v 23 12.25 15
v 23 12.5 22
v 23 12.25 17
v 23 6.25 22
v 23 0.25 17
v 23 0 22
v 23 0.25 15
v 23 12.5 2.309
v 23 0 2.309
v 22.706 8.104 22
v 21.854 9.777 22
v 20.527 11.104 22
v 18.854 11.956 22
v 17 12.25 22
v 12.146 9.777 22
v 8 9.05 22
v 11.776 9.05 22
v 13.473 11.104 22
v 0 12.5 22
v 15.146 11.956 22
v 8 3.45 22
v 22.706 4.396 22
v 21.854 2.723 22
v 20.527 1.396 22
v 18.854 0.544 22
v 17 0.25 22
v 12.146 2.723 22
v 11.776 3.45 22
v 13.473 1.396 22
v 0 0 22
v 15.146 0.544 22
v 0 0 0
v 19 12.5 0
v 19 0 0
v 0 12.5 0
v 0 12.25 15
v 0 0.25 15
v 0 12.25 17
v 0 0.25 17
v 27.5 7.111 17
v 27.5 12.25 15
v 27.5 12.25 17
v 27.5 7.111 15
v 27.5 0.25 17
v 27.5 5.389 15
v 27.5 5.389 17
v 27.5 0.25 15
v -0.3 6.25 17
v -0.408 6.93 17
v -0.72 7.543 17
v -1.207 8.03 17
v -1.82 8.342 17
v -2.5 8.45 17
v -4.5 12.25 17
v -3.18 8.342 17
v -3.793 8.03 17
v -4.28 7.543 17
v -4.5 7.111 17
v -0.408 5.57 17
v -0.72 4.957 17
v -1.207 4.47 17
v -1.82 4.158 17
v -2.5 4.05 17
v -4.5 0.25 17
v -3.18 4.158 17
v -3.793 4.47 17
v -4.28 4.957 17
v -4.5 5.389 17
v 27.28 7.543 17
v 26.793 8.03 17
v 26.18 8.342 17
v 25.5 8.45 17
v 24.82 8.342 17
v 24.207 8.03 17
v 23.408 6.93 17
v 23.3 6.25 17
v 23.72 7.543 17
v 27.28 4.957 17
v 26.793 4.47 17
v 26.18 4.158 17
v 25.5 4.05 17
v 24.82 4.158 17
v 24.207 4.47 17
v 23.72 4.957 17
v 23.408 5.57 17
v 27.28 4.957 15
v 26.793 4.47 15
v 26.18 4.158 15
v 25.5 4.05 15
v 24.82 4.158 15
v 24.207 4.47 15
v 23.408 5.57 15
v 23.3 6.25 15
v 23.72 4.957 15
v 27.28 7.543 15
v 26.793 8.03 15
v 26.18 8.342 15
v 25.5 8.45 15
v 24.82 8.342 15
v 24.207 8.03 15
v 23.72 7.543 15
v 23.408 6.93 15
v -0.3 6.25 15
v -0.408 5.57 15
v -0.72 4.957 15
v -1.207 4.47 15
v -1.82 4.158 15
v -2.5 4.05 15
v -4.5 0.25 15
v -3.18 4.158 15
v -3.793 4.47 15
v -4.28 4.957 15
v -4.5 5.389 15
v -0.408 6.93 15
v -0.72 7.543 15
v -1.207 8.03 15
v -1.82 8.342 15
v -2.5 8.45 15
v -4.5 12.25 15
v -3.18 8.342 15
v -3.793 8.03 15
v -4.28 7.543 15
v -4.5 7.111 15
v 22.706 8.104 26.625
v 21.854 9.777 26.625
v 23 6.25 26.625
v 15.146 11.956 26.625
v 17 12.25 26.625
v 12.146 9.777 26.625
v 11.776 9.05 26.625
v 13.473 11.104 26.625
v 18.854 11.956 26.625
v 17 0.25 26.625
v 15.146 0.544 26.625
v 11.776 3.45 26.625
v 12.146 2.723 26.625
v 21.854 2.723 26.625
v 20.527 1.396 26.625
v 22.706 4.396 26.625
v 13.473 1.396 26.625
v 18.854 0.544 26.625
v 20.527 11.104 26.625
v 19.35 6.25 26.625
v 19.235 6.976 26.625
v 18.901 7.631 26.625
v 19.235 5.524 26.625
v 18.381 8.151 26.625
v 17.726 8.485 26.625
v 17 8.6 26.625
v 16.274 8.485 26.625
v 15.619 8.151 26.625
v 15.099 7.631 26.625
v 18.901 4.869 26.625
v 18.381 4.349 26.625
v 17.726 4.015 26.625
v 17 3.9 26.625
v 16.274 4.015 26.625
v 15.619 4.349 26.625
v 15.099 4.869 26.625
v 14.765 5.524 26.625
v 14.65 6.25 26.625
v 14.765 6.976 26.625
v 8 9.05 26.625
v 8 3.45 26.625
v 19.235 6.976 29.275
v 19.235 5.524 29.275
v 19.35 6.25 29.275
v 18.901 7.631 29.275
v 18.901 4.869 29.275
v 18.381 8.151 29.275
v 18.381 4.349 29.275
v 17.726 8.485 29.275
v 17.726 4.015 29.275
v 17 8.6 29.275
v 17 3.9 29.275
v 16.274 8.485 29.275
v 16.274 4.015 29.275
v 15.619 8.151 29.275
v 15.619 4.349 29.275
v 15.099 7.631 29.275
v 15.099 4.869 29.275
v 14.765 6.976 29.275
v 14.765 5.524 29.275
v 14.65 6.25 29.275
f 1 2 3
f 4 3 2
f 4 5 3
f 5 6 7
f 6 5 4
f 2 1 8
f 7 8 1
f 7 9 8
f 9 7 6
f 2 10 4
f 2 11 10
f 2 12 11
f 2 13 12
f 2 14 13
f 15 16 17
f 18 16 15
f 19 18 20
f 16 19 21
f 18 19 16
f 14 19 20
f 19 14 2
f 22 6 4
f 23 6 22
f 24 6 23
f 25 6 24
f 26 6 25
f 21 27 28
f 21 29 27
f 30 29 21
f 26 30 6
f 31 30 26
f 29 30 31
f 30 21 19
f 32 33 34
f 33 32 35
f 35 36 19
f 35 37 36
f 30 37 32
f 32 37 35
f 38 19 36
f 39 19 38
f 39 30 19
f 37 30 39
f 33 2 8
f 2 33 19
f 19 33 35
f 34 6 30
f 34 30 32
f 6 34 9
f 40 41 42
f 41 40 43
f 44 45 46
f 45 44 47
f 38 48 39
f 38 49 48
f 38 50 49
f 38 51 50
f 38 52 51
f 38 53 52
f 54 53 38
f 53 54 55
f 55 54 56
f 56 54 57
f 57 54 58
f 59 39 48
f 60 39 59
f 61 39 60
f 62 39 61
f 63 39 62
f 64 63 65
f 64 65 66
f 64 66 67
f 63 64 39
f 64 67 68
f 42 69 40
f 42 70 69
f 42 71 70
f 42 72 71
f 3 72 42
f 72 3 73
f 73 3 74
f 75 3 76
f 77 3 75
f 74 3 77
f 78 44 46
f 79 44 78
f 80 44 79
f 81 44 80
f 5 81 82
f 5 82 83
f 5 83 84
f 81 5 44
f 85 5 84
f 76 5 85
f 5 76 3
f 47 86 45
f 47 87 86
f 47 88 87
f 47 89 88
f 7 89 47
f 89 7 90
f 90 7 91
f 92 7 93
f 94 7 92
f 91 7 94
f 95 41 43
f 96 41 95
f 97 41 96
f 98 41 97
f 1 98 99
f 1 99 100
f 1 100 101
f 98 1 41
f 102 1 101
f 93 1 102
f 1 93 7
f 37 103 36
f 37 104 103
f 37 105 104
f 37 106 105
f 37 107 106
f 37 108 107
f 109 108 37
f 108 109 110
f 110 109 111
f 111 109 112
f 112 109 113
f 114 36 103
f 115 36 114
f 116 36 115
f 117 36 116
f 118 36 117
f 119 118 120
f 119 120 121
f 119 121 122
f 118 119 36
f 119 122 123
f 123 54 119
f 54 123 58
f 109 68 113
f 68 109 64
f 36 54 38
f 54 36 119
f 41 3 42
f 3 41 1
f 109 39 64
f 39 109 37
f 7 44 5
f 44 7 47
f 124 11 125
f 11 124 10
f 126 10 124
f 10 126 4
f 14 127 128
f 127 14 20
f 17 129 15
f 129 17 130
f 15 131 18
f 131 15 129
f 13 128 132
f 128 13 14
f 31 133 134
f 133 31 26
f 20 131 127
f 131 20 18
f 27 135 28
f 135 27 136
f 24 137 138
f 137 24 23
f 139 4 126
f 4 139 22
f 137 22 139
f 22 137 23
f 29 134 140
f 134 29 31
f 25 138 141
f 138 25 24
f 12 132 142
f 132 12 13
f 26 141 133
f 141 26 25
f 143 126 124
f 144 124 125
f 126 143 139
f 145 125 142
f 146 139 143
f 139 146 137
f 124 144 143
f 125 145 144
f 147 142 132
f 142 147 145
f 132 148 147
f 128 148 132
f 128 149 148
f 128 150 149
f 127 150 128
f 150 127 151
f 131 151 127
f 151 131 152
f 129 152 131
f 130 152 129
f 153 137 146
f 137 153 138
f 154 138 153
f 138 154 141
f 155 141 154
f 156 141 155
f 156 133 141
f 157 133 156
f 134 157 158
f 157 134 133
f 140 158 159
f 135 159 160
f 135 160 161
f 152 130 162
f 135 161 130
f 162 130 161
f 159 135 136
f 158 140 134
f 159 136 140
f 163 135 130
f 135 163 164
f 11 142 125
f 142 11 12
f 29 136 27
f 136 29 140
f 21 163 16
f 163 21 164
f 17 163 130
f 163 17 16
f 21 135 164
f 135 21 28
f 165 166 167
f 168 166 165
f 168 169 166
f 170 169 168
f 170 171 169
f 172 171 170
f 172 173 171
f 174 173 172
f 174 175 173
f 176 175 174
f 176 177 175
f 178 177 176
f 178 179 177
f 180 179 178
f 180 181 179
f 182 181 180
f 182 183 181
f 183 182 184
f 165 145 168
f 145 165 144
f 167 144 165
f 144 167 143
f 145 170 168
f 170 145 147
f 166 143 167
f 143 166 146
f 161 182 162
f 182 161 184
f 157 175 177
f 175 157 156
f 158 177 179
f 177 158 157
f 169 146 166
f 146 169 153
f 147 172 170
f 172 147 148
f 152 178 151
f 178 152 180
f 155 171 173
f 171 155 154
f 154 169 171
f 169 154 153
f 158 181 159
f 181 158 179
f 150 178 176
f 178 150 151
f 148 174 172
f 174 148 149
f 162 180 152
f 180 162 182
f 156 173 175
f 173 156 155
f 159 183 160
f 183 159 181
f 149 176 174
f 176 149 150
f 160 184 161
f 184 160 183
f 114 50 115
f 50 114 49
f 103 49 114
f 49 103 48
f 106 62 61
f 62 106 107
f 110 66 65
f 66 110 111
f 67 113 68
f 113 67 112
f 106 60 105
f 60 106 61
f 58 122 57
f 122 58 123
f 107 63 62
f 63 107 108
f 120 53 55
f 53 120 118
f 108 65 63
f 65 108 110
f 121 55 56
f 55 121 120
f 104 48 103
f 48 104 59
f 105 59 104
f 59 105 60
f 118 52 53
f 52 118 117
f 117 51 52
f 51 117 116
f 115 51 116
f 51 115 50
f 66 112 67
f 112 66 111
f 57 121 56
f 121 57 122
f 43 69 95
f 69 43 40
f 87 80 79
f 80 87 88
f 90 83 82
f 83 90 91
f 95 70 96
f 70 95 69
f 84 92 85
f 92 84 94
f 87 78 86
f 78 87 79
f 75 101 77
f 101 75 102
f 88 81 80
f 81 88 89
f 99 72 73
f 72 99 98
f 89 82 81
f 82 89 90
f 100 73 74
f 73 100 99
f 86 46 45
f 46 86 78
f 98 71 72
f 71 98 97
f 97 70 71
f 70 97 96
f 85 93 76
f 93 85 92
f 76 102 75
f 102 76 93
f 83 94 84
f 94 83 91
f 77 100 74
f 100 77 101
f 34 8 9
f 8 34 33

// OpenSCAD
// file: libraries/ng_motor.scad
// Courtesy of http://www.thingiverse.com/thing:29734/

// base length, width, height
ng_motor_bl = 23;
ng_motor_bw = 12.5;
ng_motor_bh = 22;
ng_motor_bdim = [ng_motor_bl, ng_motor_bw, ng_motor_bh];
// mount length, width, height, x offset, y offset, bottom
ng_motor_ml = 32;
ng_motor_mw = 12;
ng_motor_mh = 2;
ng_motor_mdim = [ng_motor_ml, ng_motor_mw, ng_motor_mh];
ng_motor_mx = (ng_motor_bl - ng_motor_ml) / 2;
ng_motor_my = (ng_motor_bw - ng_motor_mw) / 2;
ng_motor_mbot = ng_motor_bh / 2 + 4;
ng_motor_mpos = [ng_motor_mx, ng_motor_my, ng_motor_mbot];
// shaft base x offset, bottom, radius, and height
ng_motor_sbr = 6;
ng_motor_sbh = 4.625;
ng_motor_sbx = ng_motor_bl / 2 + 5.5;
ng_motor_sbbot = ng_motor_bh;
ng_motor_sby = ng_motor_bw / 2;
ng_motor_sbpos = [ng_motor_sbx, ng_motor_sby, ng_motor_sbbot];
// Ignoring the small, insignificant circle
// Drive gear x offset, y offset, bottom, length, width, height
ng_motor_dgl = 5;
ng_motor_dgw = 5.6;
ng_motor_dgh = 4.625;
ng_motor_dgdim = [ng_motor_dgl, ng_motor_dgw, ng_motor_dgh];
ng_motor_dgx = ng_motor_bl / 2 - ng_motor_dgl / 2 - 1;
ng_motor_dgy = ng_motor_bw / 2 - ng_motor_dgw / 2;
ng_motor_dgbot = ng_motor_bh;
ng_motor_dgpos = [ng_motor_dgx, ng_motor_dgy, ng_motor_dgbot];
// Drive axle radius, height, x offset, y offset, bottom
ng_motor_dar = 2.35;
ng_motor_dah = 2.65;
ng_motor_dax = ng_motor_bl / 2 + 5.5;
ng_motor_day = ng_motor_bw / 2;
ng_motor_dabot = ng_motor_sbbot + ng_motor_sbh;
ng_motor_dapos = [ng_motor_dax, ng_motor_day, ng_motor_dabot];
// Cutout x offset, y offset, bottom, angle, length, width, height
ng_motor_cl = 8;
ng_motor_cw = ng_motor_bw + 0.5;
ng_motor_ch = 4;
ng_motor_cdim = [ng_motor_cl, ng_motor_cw, ng_motor_ch];
ng_motor_cx = ng_motor_bl;
ng_motor_cy = ng_motor_bw / 2;
ng_motor_cbot = 0;
ng_motor_cpos = [ng_motor_cx, ng_motor_cy, ng_motor_cbot];
ng_motor_cangle = [0, -30, 0];
// Mounting holes x offsets, y offset, bottom, radius, height
ng_motor_mhx = [ng_motor_bl / 2 - 14, ng_motor_bl / 2 + 14];
ng_motor_mhy = ng_motor_bw / 2;
ng_motor_mhbot = ng_motor_mbot;
ng_motor_mhr = 2.2;
ng_motor_mhh = ng_motor_mh;
// Color
ng_motor_body_color = "steelblue";
ng_motor_axle_color = "white";

module ng_motor() {
  difference() {
    union() {
      // Main motor body
      color(ng_motor_body_color)
	cube(ng_motor_bdim);
      // Mount
      color(ng_motor_body_color)
	translate(ng_motor_mpos)
	cube(ng_motor_mdim);
      // Larger, lower shaft base
      color(ng_motor_body_color)
	translate(ng_motor_sbpos)
	cylinder(r=ng_motor_sbr, h=ng_motor_sbh, $fn=20);
      // Small insignificant circle
      *color(ng_motor_body_color)
      	translate([-.5,0,2.75])
	cylinder(r=1, h=25.75, $fn=20, center=true);
      // Drive gear beside the shaft base
      color(ng_motor_body_color)
	translate(ng_motor_dgpos)
	cube(ng_motor_dgdim);
      // Drive axle
      color(ng_motor_axle_color)
	translate(ng_motor_dapos)
	cylinder(r=ng_motor_dar, h=ng_motor_dah, $fn=20);
    }
    // Angled part on the bottom of the servo
    translate(ng_motor_cpos)
      rotate(ng_motor_cangle)
      cube(ng_motor_cdim, center=true);
    // Mounting holes
    echo(ng_motor_mhx);
    for (hole = ng_motor_mhx) {
      echo(hole);
      translate([hole, ng_motor_mhy, ng_motor_mhbot])
	cylinder(r=ng_motor_mhr, h=ng_motor_mhh, $fn=20);
    }
  }
}
// main file
include <libraries/ng_motor.scad>;

difference() {
  ng_motor();
  *translate([0, ng_motor_bw / 2, 0])
    cube([ng_motor_bl, ng_motor_bw, ng_motor_bh]);
}
